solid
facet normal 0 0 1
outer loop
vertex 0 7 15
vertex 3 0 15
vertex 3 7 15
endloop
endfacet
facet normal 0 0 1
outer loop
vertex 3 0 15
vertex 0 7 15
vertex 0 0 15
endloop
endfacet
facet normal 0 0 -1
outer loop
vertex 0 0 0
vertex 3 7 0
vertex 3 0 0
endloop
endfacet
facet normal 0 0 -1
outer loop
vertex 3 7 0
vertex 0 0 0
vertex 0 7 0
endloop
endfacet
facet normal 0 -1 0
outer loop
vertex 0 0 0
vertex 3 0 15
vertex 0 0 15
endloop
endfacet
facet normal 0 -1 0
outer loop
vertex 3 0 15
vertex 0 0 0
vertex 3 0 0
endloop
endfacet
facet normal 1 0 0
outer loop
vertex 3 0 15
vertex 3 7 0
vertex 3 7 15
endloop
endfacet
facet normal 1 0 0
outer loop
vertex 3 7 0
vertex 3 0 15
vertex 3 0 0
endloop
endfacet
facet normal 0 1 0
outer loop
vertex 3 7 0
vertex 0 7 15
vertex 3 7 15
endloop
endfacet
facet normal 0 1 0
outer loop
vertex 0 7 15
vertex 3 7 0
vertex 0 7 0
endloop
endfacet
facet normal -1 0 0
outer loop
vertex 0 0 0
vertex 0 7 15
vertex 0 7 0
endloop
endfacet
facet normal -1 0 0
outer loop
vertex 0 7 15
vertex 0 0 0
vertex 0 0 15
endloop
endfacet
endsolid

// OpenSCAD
// Generated by SolidPython 1.0.1 on 2020-07-29 00:46:54


cube(size = [3, 7, 15]);
/***********************************************
*********      SolidPython code:      **********
************************************************
 
# import packages: SolidPython
from solid import *
from solid.utils import *
from itertools import chain, combinations, permutations


class Resize:

    def __init__(self, scad_file):
        self.scad_file = scad_file
        #self.scad_file = import_scad(scad_file)
        # cone/cylinder param:
        self.r1 = 0
        self.r2 = 0
        self.h = 0
        # rectangular prism param:
        self.w = 0
        self.l = 0
        # ellipse param:
        self.r = 0

    # import OpenScad code (file name corresponds to shape)


    # classify shape + parameters
    def assign(self, param1, param2, param3):
        if self.scad_file == 'cone.scad':
            self.r1 = param1
            self.r2 = param2
            self.h = param3
        elif self.scad_file == 'cylinder.scad':
            self.r1 = param1
            self.r2 = param2
            self.h = param3
        elif self.scad_file == 'rectangularPrism.scad':
            self.h = param1
            self.l = param2
            self.w = param3
        else:
            self.r = param1
            self.h = param2

    # resize parameters
    def iterate(self):
        x = range(3, 20, 2)
        i = 1
        if self.scad_file == 'cone.scad':
            tempList = list(permutations(x, 2))
            for temp in tempList:
                param1 = temp[0]
                param2 = temp[1]
                filepath = 'produced_scad_files/' + 'cone' + str(param1) + '_' + str(param2) + '_' + '.scad'
                scad_render_to_file(cylinder(h=param1, r1=param2, r2=0), filepath)

        elif self.scad_file == 'cylinder.scad':
            tempList = list(permutations(x, 3))
            for temp in tempList:
                param1 = temp[0]
                param2 = temp[1]
                filepath = 'produced_scad_files/' + 'cylinder' + str(param1) + '_' + str(param2) + '_' + '.scad'
                scad_render_to_file(cylinder(h=param1, r1=param2, r2=param2), filepath)

        elif self.scad_file == 'rectangularPrism.scad':
            tempList = list(permutations(x, 3))
            for temp in tempList:
                param1 = temp[0]
                param2 = temp[1]
                param3 = temp[2]
                filepath = 'produced_scad_files/' + 'rectangularPrism' + str(param1) + '_' + str(param2) + '_' + str(
                    param3) + '.scad'
                scad_render_to_file(cube(size=(param1, param2, param3)), filepath)

        elif self.scad_file == 'ellipse.scad':
            tempList = list(permutations(x, 4))
            for temp in tempList:
                param1 = temp[0]
                param2 = temp[1]
                param3 = temp[2]
                param4 = temp[3]
                filepath = 'produced_scad_files/' + 'ellipse' + str(param1) + '_' + str(param2) + '_' + str(param3) + '_' + str(param4) + '.scad'
                scad_render_to_file(scale([param1, param2, param3])(sphere(r=param4)), filepath)

    def render_to_scadfile(self):
        scad_render_to_file(scad, 'example.scad') 
 
************************************************/
